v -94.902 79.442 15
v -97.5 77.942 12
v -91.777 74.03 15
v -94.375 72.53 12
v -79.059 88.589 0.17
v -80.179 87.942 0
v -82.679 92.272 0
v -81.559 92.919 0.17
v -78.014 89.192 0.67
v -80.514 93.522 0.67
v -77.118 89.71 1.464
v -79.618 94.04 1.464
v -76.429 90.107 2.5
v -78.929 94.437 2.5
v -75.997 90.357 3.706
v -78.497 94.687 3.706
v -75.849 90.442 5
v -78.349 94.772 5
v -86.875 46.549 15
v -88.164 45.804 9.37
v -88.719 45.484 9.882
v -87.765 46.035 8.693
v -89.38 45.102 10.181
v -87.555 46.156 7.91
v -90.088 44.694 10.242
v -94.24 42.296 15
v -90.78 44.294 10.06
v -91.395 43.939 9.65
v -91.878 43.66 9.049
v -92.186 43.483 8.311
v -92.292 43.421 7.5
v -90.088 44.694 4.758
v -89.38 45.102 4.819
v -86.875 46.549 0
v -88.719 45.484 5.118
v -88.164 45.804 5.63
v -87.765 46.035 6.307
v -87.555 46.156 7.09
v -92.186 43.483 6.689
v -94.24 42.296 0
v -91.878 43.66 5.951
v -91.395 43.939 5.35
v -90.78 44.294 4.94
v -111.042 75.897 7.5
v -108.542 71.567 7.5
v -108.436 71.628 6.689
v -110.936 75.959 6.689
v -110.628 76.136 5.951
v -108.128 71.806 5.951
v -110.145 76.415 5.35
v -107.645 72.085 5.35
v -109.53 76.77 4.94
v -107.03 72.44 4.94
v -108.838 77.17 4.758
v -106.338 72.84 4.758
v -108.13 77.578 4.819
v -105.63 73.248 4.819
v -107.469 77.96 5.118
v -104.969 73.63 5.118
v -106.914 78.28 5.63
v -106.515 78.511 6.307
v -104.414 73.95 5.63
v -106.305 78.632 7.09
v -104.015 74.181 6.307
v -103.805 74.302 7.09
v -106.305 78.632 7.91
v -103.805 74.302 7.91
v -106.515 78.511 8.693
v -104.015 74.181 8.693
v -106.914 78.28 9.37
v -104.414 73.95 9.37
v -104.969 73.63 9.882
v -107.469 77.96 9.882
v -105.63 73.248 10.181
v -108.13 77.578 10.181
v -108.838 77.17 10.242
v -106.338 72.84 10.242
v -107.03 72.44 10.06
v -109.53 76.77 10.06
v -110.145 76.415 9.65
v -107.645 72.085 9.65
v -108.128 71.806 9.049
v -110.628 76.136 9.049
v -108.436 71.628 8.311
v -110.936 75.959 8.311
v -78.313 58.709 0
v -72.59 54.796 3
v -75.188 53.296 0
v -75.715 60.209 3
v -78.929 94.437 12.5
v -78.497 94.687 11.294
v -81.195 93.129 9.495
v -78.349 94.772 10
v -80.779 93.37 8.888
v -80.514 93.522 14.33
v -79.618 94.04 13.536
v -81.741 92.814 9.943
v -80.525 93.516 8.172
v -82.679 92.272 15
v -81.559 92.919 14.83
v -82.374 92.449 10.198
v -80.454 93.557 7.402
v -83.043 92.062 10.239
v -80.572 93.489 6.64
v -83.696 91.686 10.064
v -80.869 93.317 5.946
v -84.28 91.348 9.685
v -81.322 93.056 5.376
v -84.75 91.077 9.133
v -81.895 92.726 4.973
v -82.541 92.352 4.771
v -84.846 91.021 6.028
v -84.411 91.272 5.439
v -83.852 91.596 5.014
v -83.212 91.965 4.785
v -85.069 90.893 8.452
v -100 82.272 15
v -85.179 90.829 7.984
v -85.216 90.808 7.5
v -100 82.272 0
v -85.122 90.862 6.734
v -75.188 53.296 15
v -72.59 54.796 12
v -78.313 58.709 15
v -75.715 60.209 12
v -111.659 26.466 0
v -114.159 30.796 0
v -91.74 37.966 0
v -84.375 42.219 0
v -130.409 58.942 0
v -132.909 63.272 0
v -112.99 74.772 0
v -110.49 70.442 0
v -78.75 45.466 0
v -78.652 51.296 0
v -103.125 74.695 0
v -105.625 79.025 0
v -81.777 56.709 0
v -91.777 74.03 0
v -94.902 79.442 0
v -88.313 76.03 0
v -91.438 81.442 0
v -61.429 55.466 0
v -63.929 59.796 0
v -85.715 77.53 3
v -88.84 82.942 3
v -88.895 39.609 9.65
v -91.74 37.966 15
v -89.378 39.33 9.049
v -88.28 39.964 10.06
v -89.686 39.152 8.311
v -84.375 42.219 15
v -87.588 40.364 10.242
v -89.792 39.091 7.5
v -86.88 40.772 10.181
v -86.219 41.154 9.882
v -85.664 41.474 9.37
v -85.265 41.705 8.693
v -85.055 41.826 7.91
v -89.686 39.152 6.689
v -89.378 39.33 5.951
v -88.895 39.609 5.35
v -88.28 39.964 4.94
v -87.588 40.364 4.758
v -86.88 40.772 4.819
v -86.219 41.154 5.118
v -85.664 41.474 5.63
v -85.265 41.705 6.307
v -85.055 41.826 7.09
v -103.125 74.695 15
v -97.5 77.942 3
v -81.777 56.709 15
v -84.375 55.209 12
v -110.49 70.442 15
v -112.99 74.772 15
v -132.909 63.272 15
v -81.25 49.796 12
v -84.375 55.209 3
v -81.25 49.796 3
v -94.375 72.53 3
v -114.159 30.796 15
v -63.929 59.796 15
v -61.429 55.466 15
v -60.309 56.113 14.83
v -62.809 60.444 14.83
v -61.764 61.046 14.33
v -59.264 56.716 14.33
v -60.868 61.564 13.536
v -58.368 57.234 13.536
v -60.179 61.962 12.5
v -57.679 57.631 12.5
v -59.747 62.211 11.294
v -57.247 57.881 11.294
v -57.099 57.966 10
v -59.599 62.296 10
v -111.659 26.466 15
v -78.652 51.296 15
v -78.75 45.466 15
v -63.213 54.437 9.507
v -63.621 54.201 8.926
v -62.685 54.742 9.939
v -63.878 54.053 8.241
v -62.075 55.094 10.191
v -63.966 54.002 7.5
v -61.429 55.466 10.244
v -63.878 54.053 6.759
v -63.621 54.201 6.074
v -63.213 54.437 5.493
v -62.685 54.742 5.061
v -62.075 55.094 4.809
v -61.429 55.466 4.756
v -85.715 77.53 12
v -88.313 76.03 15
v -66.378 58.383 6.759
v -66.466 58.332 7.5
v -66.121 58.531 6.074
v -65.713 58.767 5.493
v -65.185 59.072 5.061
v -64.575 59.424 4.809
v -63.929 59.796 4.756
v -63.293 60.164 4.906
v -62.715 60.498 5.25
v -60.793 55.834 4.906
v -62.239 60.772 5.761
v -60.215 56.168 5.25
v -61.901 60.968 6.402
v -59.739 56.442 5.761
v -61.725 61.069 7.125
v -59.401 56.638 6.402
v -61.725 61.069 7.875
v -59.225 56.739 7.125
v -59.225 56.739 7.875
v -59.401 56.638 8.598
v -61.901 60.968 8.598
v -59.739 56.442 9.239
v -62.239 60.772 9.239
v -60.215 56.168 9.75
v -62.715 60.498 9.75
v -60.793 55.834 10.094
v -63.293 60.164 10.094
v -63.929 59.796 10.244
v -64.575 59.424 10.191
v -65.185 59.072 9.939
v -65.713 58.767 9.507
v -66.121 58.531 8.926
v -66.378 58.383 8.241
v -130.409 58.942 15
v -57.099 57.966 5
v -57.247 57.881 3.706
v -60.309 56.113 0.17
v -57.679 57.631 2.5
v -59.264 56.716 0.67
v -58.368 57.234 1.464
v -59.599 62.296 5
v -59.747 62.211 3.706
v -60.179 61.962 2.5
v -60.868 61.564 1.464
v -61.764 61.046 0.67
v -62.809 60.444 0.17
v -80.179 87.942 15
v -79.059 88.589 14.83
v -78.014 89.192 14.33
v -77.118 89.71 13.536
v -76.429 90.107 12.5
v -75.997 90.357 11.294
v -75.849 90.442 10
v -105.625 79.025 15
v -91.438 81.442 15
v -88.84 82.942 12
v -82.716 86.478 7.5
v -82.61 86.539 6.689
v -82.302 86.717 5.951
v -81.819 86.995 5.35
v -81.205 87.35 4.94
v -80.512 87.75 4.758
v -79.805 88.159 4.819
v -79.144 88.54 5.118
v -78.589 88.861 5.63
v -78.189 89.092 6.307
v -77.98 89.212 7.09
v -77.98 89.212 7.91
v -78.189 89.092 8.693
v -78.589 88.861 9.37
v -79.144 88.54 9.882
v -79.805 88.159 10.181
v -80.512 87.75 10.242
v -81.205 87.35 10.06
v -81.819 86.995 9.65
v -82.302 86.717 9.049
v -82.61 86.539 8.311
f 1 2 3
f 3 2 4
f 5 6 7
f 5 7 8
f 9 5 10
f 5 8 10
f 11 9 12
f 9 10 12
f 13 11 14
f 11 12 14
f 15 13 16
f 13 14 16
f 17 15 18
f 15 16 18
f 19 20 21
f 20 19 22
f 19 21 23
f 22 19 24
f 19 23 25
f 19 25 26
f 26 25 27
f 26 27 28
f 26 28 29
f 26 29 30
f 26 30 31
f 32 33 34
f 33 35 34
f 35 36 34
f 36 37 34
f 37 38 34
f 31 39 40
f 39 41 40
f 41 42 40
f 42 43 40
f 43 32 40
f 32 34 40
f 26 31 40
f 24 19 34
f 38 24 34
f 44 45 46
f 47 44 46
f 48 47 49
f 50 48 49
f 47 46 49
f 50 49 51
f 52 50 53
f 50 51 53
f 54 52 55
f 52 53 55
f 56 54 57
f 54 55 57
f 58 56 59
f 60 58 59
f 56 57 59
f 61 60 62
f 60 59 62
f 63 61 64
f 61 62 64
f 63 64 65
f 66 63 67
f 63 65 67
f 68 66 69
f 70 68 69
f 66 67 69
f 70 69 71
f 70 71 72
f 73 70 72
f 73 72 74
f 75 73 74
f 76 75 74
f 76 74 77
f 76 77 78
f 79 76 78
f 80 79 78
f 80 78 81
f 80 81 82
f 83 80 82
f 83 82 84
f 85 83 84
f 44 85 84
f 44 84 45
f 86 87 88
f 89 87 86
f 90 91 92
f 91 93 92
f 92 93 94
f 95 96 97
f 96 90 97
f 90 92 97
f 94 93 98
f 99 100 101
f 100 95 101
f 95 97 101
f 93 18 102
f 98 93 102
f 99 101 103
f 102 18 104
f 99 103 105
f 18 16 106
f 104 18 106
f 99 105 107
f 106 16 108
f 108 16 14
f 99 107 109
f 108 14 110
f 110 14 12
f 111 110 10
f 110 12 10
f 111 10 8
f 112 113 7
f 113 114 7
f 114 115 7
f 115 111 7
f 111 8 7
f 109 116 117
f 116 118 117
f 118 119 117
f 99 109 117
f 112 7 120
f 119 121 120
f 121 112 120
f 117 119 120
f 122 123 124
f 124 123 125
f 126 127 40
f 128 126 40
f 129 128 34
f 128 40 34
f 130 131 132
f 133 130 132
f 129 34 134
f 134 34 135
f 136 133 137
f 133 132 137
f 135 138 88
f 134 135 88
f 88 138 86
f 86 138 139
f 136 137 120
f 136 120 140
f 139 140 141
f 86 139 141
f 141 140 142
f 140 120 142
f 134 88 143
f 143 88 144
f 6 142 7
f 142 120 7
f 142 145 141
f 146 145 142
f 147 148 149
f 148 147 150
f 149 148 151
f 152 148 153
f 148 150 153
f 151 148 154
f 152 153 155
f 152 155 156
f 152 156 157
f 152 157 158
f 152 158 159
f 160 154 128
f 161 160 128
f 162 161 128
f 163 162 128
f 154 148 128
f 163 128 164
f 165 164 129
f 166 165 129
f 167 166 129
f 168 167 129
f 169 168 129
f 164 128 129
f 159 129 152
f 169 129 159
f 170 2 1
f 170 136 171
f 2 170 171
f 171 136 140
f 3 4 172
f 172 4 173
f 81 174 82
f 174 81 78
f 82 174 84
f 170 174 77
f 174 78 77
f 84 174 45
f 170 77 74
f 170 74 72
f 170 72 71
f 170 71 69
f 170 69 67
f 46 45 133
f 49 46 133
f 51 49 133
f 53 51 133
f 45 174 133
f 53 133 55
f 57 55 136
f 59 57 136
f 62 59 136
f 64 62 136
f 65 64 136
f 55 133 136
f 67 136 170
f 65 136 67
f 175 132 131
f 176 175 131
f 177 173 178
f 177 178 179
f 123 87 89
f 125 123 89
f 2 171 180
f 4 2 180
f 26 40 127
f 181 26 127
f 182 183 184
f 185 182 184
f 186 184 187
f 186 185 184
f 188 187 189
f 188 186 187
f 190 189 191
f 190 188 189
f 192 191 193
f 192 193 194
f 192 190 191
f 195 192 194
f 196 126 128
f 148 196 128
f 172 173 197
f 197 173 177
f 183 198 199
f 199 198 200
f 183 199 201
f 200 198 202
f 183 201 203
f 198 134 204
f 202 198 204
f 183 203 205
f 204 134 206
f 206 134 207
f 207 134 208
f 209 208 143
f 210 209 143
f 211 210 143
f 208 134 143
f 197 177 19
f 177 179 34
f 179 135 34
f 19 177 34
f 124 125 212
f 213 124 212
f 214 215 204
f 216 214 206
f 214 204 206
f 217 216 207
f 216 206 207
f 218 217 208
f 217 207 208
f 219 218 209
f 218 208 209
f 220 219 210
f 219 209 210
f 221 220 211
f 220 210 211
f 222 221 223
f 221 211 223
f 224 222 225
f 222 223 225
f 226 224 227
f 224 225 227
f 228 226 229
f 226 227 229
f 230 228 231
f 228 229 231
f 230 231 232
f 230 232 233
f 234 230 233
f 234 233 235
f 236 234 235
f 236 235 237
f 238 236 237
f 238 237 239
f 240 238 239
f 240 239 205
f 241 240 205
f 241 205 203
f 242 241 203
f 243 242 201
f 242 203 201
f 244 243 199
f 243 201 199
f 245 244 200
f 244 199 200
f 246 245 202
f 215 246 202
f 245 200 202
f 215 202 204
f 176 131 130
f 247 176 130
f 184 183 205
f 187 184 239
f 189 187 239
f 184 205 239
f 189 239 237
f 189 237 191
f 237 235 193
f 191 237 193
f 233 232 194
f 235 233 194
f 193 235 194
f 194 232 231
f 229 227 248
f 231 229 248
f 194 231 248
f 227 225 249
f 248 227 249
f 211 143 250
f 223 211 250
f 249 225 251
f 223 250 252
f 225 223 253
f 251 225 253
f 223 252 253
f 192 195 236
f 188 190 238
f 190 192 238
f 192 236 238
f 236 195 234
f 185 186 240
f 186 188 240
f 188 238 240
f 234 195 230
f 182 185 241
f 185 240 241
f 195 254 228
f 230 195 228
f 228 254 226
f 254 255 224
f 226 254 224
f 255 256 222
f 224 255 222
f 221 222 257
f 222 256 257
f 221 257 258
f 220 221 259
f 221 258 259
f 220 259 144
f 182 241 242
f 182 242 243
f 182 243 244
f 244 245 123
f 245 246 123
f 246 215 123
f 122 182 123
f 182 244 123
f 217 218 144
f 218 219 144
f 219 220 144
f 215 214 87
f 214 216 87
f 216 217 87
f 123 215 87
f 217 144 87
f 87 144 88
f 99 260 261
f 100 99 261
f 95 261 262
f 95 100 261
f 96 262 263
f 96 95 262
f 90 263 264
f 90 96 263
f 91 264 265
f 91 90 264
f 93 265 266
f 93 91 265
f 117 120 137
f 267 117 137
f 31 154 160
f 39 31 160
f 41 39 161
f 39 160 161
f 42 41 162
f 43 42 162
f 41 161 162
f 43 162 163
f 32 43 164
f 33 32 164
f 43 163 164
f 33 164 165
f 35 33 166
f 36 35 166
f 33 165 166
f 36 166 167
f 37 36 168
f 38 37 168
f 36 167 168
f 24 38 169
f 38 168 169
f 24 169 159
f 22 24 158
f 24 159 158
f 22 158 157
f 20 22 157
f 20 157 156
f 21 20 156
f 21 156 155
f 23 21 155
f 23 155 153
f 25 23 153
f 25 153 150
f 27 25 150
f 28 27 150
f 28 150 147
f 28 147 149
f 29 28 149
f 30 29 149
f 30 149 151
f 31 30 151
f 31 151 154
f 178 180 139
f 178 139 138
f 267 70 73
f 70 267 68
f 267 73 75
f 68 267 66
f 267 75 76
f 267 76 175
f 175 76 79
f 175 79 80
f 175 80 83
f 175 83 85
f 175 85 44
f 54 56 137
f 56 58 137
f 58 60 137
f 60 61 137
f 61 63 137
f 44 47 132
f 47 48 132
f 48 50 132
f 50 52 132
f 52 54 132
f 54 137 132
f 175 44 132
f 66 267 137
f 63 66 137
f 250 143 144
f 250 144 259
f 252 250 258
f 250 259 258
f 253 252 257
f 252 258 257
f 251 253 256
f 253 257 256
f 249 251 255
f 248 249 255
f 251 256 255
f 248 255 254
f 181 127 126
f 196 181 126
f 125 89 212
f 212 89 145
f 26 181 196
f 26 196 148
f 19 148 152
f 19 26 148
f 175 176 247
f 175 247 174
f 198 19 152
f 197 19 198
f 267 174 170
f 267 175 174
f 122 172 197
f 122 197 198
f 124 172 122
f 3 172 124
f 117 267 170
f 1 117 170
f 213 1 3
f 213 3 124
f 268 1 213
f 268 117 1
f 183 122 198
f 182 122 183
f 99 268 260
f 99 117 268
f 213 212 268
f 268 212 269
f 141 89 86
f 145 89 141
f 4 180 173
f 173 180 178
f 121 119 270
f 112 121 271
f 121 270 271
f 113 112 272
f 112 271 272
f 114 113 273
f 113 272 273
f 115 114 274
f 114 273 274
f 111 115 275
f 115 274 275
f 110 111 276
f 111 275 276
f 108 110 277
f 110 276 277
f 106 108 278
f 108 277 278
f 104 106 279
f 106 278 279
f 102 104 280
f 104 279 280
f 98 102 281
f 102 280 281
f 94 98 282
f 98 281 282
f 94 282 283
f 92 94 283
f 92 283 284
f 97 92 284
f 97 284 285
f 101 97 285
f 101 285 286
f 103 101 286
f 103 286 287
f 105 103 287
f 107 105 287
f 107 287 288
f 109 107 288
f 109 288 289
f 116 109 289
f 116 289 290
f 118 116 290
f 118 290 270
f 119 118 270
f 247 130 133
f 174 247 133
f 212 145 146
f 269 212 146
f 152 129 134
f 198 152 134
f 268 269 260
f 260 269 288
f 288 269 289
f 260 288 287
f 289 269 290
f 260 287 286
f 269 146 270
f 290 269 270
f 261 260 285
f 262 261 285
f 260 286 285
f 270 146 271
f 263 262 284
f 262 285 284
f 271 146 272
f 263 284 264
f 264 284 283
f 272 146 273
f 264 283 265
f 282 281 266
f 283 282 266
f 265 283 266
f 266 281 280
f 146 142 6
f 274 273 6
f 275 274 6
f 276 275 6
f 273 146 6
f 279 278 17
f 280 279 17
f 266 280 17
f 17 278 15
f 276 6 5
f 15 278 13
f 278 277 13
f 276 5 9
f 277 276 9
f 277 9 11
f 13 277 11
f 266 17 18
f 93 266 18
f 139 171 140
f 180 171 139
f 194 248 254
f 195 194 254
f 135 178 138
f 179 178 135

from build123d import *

# Parameters (mm, degrees)
F1_DEPTH = 15
F3_DEPTH = 60
F4_SIZE  = 3
F5_R     = 5


with BuildPart() as f1:
    # F0 (on Top) → F1 (new body)
    with BuildSketch(Plane.XY):
        Polygon((-84.375, 42.2187384345), (-78.75, 45.4663336987), (-61.4294919243, 55.4663336987), (-63.9294919243, 59.7964607176), (-72.5897459622, 54.7964607176), (-75.7147459622, 60.2091194913), (-84.375, 55.2091194913), (-81.25, 49.7964607176), (-86.875, 46.5488654534), align=None)
        Polygon((-61.4294919243, 55.4663336987), (-57.0993649054, 57.9663336987), (-59.5993649054, 62.2964607176), (-63.9294919243, 59.7964607176), align=None)
        Polygon((-91.7403810568, 37.9663336987), (-84.375, 42.2187384345), (-86.875, 46.5488654534), (-94.2403810568, 42.2964607176), align=None)
        Polygon((-84.375, 55.2091194913), (-75.7147459622, 60.2091194913), (-85.7147459622, 77.5296275669), (-87.793790014, 76.329290924), (-94.375, 72.5296275669), align=None)
        Polygon((-111.6589653438, 26.4663336987), (-91.7403810568, 37.9663336987), (-94.2403810568, 42.2964607176), (-114.1589653438, 30.7964607176), align=None)
        Polygon((-87.793790014, 76.329290924), (-85.7147459622, 77.5296275669), (-88.8397459622, 82.9422863406), (-75.8493649054, 90.4422863406), (-78.3493115936, 94.7723526968), (-100, 82.2724133595), (-105.625, 79.0248180953), (-103.125, 74.6946910764), (-97.5, 77.9422863406), (-94.375, 72.5296275669), align=None)
        Polygon((-110.4903810568, 70.4422863406), (-103.125, 74.6946910764), (-105.625, 79.0248180953), (-112.9903810568, 74.7724133595), align=None)
        Polygon((-130.4089653438, 58.9422863406), (-110.4903810568, 70.4422863406), (-112.9903810568, 74.7724133595), (-132.9089653438, 63.2724133595), align=None)
    extrude(amount=F1_DEPTH)

    # F2 (on face) → F3 (cut)
    with BuildSketch(Plane(origin=(-39.375, 68.199500548, 0), x_dir=(0.8660254038, 0.5, 0), z_dir=(0.5, -0.8660254038, 0))):
        with BuildLine():
            ThreePointArc((-52.7163336987, 7.5), (-55.4663336987, 10.25), (-58.2163336987, 7.5))
            Line((-58.2163336987, 7.5), (-55.4663336987, 7.5))
            Line((-55.4663336987, 7.5), (-52.7163336987, 7.5))
        make_face()
        with BuildLine():
            Line((-55.4663336987, 7.5), (-58.2163336987, 7.5))
            ThreePointArc((-58.2163336987, 7.5), (-55.4663336987, 4.75), (-52.7163336987, 7.5))
            Line((-52.7163336987, 7.5), (-55.4663336987, 7.5))
        make_face()
        with BuildLine():
            ThreePointArc((-22.8953336987, 7.5), (-25.6453336987, 10.25), (-28.3953336987, 7.5))
            ThreePointArc((-28.3953336987, 7.5), (-25.6453336987, 4.75), (-22.8953336987, 7.5))
        make_face()
    extrude(amount=-F3_DEPTH, mode=Mode.SUBTRACT)

    # F4
    f4_edges = [f1.edges().sort_by_distance(p)[0] for p in [
        (-89.375, 63.869374, 15),
        (-80.714746, 68.869374, 15),
        (-89.375, 63.869374, 0),
        (-80.714746, 68.869374, 0),
    ]]
    chamfer(f4_edges, length=F4_SIZE)

    # F5
    f5_edges = [f1.edges().sort_by_distance(p)[0] for p in [
        (-58.349365, 60.131397, 15),
        (-58.349365, 60.131397, 0),
        (-77.099338, 92.60732, 15),
        (-77.099338, 92.60732, 0),
    ]]
    fillet(f5_edges, radius=F5_R)


solid = f1.part
